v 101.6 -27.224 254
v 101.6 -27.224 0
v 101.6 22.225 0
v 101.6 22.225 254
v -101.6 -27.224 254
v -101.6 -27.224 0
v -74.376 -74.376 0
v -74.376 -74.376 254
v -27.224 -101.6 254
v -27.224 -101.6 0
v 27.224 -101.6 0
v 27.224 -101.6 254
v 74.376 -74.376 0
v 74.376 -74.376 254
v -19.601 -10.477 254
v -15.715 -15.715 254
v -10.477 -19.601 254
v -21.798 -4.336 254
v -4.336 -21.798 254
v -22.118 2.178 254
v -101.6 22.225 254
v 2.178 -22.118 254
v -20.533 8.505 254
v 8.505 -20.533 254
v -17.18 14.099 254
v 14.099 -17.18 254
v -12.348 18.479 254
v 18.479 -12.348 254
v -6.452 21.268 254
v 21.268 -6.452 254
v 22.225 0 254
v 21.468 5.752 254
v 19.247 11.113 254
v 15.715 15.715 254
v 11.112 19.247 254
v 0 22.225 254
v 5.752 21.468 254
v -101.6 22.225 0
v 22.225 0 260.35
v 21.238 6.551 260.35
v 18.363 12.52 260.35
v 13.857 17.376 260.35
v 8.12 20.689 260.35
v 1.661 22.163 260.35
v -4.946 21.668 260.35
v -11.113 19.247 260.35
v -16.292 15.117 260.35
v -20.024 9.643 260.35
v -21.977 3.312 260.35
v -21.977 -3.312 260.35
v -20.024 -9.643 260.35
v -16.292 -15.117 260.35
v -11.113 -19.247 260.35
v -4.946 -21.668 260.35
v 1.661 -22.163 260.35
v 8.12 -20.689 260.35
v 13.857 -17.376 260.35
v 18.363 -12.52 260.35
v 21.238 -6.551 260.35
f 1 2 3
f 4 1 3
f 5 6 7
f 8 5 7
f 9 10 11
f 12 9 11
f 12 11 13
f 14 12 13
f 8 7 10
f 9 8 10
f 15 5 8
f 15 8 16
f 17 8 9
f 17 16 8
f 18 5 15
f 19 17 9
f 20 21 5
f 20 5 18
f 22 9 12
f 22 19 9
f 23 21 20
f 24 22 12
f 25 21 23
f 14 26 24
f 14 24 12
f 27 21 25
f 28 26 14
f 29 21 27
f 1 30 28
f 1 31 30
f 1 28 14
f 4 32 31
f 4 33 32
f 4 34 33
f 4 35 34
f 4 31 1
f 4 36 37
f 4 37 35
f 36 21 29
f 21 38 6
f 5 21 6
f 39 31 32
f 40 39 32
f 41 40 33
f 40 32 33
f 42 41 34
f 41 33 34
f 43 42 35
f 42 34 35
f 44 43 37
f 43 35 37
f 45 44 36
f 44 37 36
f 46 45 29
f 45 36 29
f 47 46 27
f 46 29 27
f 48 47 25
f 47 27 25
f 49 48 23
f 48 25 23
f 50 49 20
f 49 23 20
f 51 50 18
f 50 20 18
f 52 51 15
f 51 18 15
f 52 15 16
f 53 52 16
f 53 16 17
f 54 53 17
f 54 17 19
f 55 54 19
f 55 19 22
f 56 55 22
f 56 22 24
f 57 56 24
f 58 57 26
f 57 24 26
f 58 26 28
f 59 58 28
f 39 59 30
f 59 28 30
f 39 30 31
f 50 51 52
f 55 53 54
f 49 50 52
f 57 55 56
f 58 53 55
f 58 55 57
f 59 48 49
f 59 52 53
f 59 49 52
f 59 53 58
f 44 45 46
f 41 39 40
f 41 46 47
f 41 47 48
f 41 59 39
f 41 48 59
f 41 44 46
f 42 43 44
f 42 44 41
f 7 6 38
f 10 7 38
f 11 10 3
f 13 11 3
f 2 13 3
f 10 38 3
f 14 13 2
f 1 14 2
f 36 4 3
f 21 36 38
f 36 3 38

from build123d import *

# Parameters (mm, degrees)
F1_DEPTH = 254
F2_R     = 22.225
F3_DEPTH = 6.35


with BuildPart() as f1:
    # F0 (on Top) → F1 (new body)
    with BuildSketch(Plane.XY):
        Polygon((101.6, -27.223638), (101.6, 22.225), (0, 22.225), (-101.6, 22.225), (-101.6, -27.223638), (-74.376362, -74.376362), (-27.223638, -101.6), (27.223638, -101.6), (74.376362, -74.376362), align=None)
    extrude(amount=F1_DEPTH)

    # F2 (on face) → F3 (join)
    with BuildSketch(Plane.XY.offset(254)):
        Circle(F2_R)
    extrude(amount=F3_DEPTH)


solid = f1.part
